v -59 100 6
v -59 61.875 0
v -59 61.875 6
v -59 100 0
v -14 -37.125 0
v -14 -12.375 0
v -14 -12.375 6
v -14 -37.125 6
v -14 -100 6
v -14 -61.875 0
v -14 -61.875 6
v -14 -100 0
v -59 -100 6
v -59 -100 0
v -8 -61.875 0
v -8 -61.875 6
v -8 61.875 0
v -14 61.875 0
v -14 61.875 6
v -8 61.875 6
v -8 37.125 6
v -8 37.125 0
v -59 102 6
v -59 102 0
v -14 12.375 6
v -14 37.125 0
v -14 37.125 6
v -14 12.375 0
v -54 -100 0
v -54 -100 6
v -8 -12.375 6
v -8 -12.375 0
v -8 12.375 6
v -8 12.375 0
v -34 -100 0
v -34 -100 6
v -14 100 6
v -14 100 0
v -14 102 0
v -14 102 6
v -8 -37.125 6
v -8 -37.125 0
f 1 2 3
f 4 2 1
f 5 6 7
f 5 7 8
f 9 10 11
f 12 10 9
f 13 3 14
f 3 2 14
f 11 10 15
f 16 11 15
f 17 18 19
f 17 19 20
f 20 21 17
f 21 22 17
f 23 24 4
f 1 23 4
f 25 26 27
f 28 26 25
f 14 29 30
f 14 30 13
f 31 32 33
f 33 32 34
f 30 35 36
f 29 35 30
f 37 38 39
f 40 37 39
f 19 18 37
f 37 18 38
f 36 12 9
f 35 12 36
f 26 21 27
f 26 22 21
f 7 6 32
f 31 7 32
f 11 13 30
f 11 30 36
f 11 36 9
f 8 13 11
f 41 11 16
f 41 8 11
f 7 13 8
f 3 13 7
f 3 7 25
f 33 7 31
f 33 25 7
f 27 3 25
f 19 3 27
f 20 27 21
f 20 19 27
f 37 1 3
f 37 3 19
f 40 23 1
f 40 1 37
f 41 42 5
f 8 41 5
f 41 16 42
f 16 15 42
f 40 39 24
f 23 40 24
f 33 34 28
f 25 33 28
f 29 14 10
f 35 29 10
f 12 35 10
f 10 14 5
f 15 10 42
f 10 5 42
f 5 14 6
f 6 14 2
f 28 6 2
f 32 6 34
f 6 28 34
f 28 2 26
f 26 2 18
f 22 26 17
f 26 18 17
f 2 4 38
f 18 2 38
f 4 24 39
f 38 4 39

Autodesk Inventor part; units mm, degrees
ref_plane "YZ Plane" through (0, 0, 0) normal (1, 0, 0) x (0, 1, 0)
ref_plane "XZ Plane" through (0, 0, 0) normal (0, 1, 0) x (-1, 0, 0)
ref_plane "XY Plane" through (0, 0, 0) normal (0, 0, 1) x (1, 0, 0)
sketch "Sketch1" plane through (0, 0, 0) normal (0, 0, 1) x (1, 0, 0)
  line L0 (-59, 61.875) -> (-59, 100)
  line L1 (-34, -100) -> (-54, -100)
  line L2 (-14, -12.375) -> (-8, -12.375)
  line L3 (-8, 37.125) -> (-14, 37.125)
  line L4 (-14, 61.875) -> (-8, 61.875)
  line L5 (-8, 12.375) -> (-14, 12.375)
  line L6 (-8, -37.125) -> (-14, -37.125)
  line L7 (-14, -61.875) -> (-8, -61.875)
  line L8 (-14, 61.875) -> (-14, 100)
  line L9 (-14, 37.125) -> (-14, 12.375)
  line L10 (-8, 37.125) -> (-8, 61.875)
  line L11 (-14, -12.375) -> (-14, -37.125)
  line L12 (-8, -61.875) -> (-8, -37.125)
  line L13 (-8, -12.375) -> (-8, 12.375)
  line L14 (-14, -61.875) -> (-14, -100)
  line L15 (-14, -100) -> (-59, -100)
  line L16 (-14, 100) -> (-14, 102)
  line L17 (-14, 102) -> (-59, 102)
  line L18 (-59, 102) -> (-59, 100)
  line L19 (-59, 61.875) -> (-59, -100)
  point P0 (-60, 61.875)
  point P1 (-60, 37.125)
  point P2 (-60, 12.375)
  point P3 (-60, -12.375)
  point P4 (-60, -37.125)
  point P5 (-60, -61.875)
  dimension "d23" = 45
extrude "Extrusion1" add sketch "Sketch1" along normal blind 6
properties part number "Side_2"
